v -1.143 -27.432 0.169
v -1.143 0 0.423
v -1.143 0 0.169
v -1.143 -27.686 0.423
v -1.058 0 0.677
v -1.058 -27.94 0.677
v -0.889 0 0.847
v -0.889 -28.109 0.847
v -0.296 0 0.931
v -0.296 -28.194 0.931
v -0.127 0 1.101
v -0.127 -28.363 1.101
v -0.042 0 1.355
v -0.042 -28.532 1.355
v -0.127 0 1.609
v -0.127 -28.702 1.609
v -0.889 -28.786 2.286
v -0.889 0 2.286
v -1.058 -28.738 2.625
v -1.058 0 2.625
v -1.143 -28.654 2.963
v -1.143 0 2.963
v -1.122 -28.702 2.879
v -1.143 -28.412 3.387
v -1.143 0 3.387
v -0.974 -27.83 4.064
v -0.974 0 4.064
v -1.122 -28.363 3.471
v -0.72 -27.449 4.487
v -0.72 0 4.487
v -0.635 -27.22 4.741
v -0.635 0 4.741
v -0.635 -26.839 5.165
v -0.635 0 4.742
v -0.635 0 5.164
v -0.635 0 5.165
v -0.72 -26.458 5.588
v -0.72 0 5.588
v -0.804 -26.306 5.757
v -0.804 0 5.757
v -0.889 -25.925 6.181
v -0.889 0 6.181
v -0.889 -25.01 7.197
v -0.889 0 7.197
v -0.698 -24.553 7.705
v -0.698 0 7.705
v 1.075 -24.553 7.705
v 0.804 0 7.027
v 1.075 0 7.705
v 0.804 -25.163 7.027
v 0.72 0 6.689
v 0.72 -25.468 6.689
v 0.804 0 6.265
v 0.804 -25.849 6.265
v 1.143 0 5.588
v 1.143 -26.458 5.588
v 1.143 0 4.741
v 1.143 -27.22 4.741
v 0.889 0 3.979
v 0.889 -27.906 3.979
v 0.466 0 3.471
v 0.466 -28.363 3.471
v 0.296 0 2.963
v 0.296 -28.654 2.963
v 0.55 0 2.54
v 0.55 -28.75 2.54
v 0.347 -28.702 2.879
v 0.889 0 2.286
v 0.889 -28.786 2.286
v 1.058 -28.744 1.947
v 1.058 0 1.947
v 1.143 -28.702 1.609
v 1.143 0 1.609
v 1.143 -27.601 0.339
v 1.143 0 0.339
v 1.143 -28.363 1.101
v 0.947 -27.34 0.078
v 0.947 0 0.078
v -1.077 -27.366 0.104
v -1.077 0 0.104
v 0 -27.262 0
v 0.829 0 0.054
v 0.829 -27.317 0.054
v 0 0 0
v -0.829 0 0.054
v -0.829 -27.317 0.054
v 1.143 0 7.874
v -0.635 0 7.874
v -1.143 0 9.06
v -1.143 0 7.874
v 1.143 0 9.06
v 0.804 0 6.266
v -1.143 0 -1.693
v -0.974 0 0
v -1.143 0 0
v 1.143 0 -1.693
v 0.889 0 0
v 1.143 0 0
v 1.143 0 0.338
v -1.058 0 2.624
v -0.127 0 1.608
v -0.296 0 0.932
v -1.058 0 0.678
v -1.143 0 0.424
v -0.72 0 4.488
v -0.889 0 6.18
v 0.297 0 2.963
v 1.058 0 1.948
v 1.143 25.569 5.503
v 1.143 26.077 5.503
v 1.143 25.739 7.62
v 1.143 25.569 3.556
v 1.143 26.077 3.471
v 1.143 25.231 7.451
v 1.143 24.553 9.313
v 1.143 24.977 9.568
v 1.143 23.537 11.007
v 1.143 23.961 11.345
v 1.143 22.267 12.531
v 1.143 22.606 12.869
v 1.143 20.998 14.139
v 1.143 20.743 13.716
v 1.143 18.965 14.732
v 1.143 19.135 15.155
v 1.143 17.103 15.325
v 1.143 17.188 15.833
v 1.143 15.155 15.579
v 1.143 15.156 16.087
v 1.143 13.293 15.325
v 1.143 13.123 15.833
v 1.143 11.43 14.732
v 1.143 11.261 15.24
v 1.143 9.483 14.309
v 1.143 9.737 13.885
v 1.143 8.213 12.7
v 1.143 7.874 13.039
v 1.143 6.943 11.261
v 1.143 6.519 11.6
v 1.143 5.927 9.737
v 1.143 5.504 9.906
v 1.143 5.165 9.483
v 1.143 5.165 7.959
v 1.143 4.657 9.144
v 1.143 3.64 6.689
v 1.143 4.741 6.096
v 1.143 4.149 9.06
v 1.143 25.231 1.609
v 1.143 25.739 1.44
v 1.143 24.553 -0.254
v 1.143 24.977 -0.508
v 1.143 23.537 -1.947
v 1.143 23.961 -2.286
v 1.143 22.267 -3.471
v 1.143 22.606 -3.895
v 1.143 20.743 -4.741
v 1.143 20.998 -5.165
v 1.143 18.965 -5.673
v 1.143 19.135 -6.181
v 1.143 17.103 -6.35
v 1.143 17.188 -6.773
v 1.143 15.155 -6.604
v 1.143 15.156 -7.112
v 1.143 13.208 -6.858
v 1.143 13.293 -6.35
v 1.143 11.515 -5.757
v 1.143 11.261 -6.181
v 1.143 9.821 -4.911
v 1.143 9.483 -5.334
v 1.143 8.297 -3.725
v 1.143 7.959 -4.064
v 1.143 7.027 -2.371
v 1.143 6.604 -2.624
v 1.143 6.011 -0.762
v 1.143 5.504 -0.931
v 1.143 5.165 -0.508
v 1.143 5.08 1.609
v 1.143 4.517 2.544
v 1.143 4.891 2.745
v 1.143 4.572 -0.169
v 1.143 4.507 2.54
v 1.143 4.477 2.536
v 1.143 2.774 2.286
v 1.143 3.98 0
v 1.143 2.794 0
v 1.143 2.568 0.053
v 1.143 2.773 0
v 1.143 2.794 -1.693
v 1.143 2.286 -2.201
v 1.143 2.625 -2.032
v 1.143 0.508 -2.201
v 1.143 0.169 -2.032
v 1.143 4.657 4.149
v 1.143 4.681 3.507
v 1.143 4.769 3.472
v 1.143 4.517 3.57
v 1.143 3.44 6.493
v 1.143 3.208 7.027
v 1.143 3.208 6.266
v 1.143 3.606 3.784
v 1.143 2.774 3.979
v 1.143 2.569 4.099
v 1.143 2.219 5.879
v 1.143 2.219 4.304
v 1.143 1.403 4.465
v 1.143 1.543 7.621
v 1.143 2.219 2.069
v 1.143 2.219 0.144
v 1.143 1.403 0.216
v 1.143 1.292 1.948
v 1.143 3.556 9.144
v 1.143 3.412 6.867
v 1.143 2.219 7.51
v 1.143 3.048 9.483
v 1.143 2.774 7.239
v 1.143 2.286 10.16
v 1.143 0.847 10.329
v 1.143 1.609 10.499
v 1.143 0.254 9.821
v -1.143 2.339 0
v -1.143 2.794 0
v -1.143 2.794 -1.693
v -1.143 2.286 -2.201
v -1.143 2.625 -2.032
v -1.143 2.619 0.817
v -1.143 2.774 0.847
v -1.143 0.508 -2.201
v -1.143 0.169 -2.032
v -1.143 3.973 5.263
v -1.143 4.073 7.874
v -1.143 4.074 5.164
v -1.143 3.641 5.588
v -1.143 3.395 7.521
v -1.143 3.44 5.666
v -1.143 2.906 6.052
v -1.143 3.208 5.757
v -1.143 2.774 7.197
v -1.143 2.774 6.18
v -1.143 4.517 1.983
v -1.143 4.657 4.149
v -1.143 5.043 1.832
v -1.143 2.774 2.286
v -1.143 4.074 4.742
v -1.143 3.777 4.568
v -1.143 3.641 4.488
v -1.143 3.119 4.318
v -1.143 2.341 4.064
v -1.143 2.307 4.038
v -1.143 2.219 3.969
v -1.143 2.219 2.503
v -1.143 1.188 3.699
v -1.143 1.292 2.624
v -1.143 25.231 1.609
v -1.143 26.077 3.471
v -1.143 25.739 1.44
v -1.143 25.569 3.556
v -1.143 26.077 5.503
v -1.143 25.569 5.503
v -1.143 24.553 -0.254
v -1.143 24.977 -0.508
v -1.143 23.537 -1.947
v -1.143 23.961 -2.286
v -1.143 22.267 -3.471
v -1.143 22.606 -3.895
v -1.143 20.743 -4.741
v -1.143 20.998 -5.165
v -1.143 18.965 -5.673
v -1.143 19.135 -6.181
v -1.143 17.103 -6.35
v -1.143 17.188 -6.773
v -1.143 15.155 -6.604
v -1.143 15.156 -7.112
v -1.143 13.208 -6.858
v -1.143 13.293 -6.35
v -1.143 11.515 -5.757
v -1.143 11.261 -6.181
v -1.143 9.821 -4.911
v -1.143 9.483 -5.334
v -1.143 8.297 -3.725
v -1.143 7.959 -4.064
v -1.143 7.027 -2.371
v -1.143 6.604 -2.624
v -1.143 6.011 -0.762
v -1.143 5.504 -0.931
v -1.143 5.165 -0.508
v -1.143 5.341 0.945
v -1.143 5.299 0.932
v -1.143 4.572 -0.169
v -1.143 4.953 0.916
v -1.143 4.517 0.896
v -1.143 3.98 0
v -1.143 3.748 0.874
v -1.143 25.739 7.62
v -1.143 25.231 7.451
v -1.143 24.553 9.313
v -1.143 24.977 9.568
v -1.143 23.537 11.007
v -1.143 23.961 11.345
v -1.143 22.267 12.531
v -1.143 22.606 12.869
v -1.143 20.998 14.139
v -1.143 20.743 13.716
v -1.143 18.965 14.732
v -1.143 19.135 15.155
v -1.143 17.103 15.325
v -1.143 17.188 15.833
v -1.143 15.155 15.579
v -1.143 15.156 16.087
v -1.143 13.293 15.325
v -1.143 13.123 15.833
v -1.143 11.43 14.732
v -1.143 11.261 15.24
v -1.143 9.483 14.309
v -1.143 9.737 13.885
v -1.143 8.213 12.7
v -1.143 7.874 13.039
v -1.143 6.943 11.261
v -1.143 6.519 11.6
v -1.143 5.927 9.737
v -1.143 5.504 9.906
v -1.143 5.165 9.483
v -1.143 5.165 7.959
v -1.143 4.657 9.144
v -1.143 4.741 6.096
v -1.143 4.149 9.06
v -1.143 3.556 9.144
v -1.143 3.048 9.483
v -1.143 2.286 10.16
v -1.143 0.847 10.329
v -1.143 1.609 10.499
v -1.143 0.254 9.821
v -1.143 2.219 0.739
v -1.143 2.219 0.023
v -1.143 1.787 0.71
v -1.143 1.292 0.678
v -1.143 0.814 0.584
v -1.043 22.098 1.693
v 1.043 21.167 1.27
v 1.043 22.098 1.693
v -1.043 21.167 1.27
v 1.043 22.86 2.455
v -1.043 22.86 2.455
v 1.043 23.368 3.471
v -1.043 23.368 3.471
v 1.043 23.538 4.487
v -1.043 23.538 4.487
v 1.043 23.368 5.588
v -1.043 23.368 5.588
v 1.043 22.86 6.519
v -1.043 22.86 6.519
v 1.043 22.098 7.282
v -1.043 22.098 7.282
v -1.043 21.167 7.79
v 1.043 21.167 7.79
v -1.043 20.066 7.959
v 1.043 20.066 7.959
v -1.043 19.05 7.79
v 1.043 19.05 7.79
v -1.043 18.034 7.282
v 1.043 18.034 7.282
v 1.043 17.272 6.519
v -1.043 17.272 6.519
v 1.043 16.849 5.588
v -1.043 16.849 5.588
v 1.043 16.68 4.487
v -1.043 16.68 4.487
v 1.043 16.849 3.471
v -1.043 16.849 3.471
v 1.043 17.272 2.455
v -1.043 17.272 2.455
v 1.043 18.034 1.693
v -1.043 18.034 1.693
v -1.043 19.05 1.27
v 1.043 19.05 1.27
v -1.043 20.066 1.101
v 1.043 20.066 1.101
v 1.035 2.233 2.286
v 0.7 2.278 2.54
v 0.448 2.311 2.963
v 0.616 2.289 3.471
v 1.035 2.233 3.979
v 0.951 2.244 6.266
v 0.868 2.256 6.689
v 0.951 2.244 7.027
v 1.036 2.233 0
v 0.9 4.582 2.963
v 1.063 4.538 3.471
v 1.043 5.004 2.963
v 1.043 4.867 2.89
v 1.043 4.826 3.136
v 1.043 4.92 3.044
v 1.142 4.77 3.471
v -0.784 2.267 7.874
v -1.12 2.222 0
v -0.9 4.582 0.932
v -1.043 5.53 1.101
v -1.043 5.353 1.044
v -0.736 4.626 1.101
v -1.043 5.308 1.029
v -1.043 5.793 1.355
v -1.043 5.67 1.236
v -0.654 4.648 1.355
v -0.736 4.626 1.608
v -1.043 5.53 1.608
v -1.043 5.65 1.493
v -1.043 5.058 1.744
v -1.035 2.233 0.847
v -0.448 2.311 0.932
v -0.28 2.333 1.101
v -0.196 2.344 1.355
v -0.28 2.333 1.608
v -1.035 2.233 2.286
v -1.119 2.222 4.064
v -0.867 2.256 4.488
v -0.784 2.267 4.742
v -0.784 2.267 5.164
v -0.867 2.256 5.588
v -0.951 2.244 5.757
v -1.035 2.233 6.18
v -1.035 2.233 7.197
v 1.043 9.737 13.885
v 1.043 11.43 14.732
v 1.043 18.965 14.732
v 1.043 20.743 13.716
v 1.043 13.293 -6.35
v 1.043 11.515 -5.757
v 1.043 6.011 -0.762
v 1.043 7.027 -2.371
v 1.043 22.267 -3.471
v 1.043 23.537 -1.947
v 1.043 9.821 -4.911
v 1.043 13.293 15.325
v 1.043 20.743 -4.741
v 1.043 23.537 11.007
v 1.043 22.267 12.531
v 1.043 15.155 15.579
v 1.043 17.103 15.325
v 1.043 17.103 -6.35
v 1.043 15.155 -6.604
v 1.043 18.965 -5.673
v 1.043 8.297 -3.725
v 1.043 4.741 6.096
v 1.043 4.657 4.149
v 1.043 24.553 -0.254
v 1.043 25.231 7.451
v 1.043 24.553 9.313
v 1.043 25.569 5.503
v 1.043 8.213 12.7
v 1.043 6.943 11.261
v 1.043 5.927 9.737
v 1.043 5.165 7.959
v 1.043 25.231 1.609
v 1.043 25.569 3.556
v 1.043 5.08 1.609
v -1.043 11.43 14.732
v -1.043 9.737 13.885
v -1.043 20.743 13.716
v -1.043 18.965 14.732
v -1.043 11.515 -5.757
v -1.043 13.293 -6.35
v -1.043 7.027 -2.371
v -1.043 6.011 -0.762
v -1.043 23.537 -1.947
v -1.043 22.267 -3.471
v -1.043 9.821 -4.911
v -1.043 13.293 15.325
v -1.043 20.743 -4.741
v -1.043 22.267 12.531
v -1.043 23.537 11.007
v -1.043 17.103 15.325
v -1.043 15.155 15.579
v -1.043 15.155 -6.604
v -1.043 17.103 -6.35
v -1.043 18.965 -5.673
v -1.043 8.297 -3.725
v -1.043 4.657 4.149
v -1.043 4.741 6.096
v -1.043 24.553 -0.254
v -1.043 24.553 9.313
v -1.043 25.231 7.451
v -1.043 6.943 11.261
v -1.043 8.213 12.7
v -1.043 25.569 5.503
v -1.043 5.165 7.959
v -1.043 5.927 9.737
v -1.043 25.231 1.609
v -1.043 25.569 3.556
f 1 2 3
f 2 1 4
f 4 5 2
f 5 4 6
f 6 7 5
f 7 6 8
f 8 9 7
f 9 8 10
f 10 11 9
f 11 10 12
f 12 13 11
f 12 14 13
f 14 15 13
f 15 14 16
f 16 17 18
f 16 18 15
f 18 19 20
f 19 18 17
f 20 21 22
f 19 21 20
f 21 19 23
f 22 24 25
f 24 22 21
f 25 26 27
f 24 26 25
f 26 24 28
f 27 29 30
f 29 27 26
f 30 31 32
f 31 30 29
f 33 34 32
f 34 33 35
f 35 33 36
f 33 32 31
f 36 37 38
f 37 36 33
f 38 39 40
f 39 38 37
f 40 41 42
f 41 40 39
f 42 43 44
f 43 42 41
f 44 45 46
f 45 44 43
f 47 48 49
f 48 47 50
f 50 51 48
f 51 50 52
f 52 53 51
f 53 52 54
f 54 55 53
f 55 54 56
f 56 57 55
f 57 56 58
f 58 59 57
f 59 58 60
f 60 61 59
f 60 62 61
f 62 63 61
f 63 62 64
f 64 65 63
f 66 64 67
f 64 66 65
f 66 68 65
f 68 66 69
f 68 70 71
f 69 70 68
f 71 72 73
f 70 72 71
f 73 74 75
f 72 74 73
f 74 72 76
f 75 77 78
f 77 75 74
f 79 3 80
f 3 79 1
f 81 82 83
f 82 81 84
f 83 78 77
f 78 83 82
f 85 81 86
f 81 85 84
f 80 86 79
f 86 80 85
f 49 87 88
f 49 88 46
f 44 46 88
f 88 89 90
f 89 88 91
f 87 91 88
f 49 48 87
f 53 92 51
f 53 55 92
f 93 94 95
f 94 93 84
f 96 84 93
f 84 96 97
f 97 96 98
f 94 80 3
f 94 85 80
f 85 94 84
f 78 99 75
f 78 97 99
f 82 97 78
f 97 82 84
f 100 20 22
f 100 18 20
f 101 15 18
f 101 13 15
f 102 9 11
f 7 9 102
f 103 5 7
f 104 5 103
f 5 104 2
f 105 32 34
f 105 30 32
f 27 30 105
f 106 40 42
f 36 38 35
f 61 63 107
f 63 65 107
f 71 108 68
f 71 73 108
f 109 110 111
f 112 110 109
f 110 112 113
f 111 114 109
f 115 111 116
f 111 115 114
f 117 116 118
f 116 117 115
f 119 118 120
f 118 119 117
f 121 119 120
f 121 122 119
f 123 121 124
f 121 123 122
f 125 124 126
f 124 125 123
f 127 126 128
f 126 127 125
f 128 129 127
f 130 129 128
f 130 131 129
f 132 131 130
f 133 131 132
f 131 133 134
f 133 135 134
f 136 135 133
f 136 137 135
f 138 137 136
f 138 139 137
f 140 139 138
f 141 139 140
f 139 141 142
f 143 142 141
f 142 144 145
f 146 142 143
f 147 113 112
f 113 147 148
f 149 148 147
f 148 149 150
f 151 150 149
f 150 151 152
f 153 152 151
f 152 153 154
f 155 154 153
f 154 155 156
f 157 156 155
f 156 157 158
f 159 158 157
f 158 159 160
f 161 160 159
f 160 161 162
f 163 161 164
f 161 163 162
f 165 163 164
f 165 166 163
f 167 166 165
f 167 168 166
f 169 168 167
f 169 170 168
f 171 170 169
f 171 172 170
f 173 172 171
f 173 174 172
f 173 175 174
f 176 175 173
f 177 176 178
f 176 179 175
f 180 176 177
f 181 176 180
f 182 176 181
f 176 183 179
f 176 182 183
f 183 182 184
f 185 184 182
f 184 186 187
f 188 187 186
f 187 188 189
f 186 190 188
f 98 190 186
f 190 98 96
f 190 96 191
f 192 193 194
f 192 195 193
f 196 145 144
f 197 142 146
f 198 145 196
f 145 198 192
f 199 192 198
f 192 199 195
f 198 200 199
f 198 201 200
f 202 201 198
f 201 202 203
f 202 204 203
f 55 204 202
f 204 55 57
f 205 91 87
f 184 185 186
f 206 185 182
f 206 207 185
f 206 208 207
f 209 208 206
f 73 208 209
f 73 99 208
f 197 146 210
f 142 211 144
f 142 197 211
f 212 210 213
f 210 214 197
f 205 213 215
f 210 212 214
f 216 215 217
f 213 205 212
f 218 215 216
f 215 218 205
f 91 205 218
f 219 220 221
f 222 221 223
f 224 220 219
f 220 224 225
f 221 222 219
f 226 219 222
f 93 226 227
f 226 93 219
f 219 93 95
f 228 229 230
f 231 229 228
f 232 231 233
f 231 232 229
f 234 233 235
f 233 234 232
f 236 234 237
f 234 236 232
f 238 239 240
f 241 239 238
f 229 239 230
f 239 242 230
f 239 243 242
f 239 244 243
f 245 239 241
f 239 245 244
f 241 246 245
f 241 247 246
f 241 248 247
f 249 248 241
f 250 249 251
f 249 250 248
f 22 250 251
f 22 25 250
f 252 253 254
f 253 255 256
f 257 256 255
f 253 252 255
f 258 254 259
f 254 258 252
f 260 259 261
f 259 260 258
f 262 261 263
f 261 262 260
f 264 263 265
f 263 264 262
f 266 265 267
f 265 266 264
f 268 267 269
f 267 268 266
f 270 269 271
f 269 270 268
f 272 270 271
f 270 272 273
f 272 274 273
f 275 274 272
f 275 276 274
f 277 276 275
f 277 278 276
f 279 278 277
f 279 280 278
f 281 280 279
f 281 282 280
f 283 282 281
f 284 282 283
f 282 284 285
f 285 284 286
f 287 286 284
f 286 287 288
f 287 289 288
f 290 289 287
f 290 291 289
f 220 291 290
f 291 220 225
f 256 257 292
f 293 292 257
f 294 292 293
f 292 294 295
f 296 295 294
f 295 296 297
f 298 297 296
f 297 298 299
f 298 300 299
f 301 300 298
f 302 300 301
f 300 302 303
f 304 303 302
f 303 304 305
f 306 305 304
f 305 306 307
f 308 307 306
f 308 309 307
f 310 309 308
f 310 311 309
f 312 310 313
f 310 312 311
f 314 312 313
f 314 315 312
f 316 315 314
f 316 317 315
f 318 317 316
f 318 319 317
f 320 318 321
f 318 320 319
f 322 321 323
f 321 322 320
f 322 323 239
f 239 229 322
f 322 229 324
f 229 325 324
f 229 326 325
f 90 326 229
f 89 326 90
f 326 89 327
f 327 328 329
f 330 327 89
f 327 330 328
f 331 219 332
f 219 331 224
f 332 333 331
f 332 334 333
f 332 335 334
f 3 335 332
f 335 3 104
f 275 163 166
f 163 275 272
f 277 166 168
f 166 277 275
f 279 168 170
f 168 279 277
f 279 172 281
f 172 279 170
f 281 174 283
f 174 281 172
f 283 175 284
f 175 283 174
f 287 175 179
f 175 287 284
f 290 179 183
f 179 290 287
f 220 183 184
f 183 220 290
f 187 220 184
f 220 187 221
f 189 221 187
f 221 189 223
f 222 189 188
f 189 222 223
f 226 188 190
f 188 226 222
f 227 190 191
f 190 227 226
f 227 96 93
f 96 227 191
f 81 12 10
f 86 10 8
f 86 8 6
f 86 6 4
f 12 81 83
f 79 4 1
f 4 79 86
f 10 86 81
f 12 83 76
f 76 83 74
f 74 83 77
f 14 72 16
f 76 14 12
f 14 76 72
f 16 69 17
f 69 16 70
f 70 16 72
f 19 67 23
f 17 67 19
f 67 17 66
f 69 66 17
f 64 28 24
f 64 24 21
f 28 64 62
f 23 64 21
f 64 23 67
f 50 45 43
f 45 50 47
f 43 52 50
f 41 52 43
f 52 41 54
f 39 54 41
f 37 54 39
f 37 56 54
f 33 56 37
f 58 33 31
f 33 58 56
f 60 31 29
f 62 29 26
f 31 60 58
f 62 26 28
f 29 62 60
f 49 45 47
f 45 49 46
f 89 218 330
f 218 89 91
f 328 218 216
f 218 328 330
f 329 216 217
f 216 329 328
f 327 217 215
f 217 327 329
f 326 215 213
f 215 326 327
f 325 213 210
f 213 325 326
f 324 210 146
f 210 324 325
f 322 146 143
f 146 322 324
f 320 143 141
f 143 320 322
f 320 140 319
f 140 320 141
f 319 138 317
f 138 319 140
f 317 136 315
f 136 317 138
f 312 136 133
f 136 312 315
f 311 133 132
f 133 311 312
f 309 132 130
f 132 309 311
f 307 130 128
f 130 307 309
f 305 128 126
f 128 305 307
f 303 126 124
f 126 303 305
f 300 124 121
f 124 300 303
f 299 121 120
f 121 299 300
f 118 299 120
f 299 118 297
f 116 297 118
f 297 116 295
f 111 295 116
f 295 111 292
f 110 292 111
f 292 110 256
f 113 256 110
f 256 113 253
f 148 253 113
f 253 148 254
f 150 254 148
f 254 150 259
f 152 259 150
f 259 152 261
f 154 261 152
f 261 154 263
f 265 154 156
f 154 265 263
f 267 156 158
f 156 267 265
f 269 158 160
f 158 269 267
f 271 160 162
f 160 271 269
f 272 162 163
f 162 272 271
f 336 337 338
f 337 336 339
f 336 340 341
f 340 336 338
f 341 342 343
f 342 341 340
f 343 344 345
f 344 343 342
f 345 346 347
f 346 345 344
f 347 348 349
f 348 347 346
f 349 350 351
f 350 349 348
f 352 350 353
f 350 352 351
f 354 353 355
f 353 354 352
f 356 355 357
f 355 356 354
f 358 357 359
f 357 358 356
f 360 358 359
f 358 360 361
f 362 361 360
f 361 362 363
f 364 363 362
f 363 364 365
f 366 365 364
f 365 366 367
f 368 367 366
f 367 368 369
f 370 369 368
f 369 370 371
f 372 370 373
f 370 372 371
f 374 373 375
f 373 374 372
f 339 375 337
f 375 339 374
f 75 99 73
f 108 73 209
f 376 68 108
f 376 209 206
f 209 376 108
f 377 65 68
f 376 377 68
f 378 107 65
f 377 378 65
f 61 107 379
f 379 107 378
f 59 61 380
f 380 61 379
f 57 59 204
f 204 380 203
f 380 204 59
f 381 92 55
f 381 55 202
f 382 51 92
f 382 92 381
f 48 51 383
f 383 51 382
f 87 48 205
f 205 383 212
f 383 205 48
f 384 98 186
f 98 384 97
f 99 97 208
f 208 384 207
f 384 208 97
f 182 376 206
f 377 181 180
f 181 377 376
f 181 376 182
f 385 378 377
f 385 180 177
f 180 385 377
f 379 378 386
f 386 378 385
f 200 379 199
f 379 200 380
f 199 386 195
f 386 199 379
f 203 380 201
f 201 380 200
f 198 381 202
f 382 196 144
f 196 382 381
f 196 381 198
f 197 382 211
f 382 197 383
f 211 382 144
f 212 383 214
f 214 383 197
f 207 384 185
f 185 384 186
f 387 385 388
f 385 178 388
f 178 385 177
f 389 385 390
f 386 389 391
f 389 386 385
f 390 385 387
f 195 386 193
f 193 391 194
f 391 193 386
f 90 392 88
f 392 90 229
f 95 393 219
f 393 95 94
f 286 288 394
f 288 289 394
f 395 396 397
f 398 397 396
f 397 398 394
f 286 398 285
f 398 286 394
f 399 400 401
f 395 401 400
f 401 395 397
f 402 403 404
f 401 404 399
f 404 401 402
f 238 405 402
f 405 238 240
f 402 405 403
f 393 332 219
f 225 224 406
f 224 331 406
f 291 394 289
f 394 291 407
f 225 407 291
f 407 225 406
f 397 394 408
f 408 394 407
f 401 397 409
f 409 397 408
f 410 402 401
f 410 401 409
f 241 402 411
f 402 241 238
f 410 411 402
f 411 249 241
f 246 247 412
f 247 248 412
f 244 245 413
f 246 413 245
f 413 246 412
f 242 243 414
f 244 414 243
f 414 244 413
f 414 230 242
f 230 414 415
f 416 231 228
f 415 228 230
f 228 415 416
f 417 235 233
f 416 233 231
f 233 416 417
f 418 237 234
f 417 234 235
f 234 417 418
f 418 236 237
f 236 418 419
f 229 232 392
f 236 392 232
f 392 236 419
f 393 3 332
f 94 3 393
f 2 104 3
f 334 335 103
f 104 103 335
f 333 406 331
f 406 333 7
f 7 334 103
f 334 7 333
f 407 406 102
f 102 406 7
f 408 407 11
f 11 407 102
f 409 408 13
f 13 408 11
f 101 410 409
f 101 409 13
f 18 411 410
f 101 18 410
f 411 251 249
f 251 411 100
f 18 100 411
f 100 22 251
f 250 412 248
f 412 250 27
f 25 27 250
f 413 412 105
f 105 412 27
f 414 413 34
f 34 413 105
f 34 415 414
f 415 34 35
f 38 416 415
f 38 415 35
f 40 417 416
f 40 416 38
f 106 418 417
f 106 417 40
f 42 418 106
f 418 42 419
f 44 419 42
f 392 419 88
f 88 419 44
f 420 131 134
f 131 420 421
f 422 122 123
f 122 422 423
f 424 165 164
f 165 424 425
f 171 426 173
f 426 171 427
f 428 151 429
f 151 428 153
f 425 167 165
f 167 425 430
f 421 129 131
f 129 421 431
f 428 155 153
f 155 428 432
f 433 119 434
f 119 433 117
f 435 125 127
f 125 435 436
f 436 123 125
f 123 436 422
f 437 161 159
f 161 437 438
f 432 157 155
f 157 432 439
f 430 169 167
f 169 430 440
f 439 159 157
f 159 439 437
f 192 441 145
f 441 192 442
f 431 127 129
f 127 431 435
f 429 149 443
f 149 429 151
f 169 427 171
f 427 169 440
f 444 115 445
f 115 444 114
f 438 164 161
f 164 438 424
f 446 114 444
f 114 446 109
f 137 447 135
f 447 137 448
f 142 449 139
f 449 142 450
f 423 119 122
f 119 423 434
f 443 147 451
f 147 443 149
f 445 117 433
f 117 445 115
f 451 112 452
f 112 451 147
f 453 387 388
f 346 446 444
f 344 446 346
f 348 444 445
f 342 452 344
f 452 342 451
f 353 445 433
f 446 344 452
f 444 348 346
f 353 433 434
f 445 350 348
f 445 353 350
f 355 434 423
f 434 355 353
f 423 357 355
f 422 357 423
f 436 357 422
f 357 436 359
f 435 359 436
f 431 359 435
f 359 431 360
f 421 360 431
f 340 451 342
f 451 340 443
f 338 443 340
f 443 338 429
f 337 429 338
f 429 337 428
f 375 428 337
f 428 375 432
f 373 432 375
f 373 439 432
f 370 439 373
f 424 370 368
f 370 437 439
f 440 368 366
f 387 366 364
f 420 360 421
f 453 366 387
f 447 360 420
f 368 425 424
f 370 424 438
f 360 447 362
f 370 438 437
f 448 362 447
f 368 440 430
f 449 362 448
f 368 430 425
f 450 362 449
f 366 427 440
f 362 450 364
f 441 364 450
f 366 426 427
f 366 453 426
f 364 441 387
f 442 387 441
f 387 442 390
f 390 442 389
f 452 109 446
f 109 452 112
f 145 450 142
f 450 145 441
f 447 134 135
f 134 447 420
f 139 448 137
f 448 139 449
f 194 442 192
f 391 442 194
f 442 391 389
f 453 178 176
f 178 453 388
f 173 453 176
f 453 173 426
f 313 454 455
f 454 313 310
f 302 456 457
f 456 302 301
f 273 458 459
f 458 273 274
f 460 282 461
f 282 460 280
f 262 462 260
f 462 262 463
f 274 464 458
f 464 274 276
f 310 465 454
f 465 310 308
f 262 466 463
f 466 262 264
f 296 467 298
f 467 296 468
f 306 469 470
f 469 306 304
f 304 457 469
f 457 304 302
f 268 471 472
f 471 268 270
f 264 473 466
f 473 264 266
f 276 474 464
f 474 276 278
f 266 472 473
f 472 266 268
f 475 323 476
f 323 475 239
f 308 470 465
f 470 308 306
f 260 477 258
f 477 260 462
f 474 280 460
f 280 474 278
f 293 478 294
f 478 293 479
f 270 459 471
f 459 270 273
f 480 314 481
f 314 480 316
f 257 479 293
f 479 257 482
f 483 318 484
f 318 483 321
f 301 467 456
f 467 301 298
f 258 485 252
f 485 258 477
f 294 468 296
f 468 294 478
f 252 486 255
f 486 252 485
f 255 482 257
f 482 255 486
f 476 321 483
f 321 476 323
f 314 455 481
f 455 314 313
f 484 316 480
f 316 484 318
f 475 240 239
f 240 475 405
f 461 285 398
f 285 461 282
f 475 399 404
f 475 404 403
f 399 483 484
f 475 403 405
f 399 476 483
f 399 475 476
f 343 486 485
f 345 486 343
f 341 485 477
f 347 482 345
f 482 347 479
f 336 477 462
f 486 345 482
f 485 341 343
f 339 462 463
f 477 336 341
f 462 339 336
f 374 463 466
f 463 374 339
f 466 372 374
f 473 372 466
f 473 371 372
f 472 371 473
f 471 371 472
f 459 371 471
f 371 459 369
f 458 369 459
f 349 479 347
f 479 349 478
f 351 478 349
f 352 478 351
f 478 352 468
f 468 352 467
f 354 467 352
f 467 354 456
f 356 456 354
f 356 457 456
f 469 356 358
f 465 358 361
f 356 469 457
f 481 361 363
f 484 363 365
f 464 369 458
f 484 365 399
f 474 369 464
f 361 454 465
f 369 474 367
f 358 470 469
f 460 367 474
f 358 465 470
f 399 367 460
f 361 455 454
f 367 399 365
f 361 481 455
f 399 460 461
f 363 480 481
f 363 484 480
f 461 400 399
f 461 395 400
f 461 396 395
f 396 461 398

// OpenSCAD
use <keygen.scad>
include <medeco.scad>

module medeco_biaxial(bitting="",
                      outline_name="1515",
                      warding_name="1515") {

    name = "Medeco Biaxial";

    /*
        "A" variants of key outlines indicates 6-pin version.

        Bitting is specified from bow to tip, 1-6, with 1 being the shallowest cut and 6 being the deepest.

        After each number, a letter K,B,Q,M,D,S is specified for the cut angle and offset.

        Example: 2K5B3Q6M3S
    */

    outlines_k = ["A1515",
                  "1515",
                  "A1517",
                  "1517",
                  "1518",
                  "1542",
                  "1543",
                  "A1638",
                  "1638",
                  "1644",
                  "1655"];

    wardings_k = ["1515",
                  "1517",
                  "1518",
                  "1542",
                  "1543",
                  "1638",
                  "1644",
                  "1655"];

    outline_param = key_lkup(outlines_k, outlines_v, outline_name);
    outline_points = outline_param[0];
    outline_paths = outline_param[1];
    offset = outline_param[2];
    engrave_points = outline_param[3];
    engrave_paths = outline_param[4];

    warding_points = key_lkup(wardings_k, wardings_v, warding_name);
    
    cut_locations = [for(i=[0.244, 0.414, 0.584, 0.754, 0.924, 1.094]) i*25.4];
    depth_table = [for(i=[0.272+0.025:-0.025:0.141]) i*25.4];
    angles_k = ["K", "B", "Q", "M", "D", "S"];
    angles_v = [[20, -.7874], [0, -.7874], [-20, -.7874],
                [20, .7874],  [0, .7874],  [-20, .7874]];

    bitting_depth = [for(i=[0:2:len(bitting)-1]) bitting[i]];
    bitting_angle = [for(i=[1:2:len(bitting)-1]) bitting[i]];
    heights = key_code_to_heights(bitting_depth, depth_table);
    angles_and_offsets = [for(c=bitting_angle) key_lkup(angles_k, angles_v, c)];
    angles = [for(c=angles_and_offsets) c[0]];
    offsets = [for(c=angles_and_offsets) c[1]];

    difference() {
        if($children == 0) {
            key_blank(outline_points,
                      warding_points,
                      outline_paths=outline_paths,
                      engrave_right_points=engrave_points,
                      engrave_right_paths=engrave_paths,
                      engrave_left_points=engrave_points,
                      engrave_left_paths=engrave_paths,
                      offset=offset,
                      plug_diameter=12.7);
        } else {
            children(0);
        }
        key_bitting(heights, cut_locations + offsets,
                    flat=.381, angle=86, // from CW-1012 cutter specs
                    angles=angles);
    }
}

// Defaults
bitting="";
outline="1515";
warding="1515";
medeco_biaxial(bitting, outline, warding);
